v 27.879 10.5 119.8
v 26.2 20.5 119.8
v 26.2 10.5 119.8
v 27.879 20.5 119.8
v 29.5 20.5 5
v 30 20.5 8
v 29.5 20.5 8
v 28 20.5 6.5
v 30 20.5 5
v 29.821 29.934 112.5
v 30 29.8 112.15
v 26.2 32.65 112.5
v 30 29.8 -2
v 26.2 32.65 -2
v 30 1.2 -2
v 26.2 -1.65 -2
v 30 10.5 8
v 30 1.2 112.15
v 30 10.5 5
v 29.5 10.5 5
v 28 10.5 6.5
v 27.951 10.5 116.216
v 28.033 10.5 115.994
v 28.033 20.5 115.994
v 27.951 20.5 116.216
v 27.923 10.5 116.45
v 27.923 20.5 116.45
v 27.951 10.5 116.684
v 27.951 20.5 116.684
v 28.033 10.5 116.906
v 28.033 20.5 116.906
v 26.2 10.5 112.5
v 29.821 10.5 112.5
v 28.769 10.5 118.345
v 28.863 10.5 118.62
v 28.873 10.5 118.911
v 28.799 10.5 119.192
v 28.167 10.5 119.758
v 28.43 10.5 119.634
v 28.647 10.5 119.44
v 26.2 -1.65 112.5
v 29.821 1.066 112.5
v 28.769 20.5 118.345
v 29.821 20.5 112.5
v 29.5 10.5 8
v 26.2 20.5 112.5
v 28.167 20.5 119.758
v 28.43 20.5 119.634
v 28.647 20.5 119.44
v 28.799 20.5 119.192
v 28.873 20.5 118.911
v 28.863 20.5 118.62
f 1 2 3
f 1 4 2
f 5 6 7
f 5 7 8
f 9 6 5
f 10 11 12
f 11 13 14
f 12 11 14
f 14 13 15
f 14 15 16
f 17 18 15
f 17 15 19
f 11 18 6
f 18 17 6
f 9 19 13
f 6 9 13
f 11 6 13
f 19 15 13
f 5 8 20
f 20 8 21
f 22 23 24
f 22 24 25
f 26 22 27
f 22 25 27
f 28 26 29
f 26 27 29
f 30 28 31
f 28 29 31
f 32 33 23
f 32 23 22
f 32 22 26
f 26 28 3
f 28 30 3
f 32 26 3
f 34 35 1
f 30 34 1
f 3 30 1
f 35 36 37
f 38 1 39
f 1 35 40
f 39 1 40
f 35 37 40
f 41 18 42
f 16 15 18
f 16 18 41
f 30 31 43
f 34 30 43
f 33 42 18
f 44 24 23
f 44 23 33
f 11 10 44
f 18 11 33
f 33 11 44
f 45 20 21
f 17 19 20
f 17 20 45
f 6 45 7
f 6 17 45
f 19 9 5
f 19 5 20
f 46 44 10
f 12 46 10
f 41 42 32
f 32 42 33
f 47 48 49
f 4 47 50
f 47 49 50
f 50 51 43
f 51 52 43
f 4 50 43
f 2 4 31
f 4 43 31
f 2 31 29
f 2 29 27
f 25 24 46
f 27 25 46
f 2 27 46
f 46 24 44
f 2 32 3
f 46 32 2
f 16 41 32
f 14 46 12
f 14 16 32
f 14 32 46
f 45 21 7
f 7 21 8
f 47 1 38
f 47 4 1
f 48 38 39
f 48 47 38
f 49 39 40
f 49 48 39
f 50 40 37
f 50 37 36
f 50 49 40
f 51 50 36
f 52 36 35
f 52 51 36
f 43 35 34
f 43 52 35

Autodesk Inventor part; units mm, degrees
ref_plane "YZ Plane" through (0, 0, 0) normal (1, 0, 0) x (0, 1, 0)
ref_plane "Work Plane3" through (0, -2, -2) normal (0, 0, -1) x (-1, 0, 0)
sketch "Sketch4" plane through (0, -2, -2) normal (0, 0, -1) x (-1, 0, 0)
  line L0 (-30, 2) -> (-30, 3) projected
  line L1 (3, -2) -> (-26, -2) projected
  line L2 (7, 2) -> (7, 33) projected
  line L3 (3, 37) -> (-26, 37) projected
  line L4 (-27, 17.5) -> (-42, 17.5)
  line L5 (-30, 3.2) -> (-26, 0.2)
  line L6 (-26.2, 0.2) -> (-26.2, 17.5)
  line L7 (-30, 3.2) -> (-30, 17.5)
  line L8 (-30, 31.8) -> (-26, 34.8)
  line L9 (-26.2, 34.8) -> (-26.2, 17.5)
  line L10 (-30, 31.8) -> (-30, 17.5)
  arc A0 (3, -2) -> (7, 2) centre (3, 2) ccw projected
  arc A1 (7, 33) -> (3, 37) centre (3, 33) ccw projected
  arc A2 (-26, 37) -> (-30, 33) centre (-26, 33) ccw projected
  arc A3 (-30, 2) -> (-26, -2) centre (-26, 2) ccw projected
  line L11 (-30, 32) -> (-30, 33) projected
  line L12 (-26, 35) -> (-26, 0) projected
  line L13 (-26, 0) -> (-30, 3) projected
  line L14 (-26.2, 3.2) -> (-25.2, 3.2)
  line L15 (-25.2, 3.2) -> (-25.2, 17.5)
  line L16 (-26.2, 31.8) -> (-25.2, 31.8)
  line L17 (-25.2, 31.8) -> (-25.2, 17.5)
  line L18 (-30, 32) -> (-26, 35) projected
  circle A4 centre (-11.5, 17.5) radius 8 projected
  point P0 (0, 2)
  point P1 (-26.2, 0.35)
  point P2 (-26.2, 34.65)
  point P3 (-26.2, 31.8)
  dimension "d55" = 1
  dimension "d56" = 4
  dimension "d57" = 3
  dimension "d58" = 0.2
  dimension "d59" = 3.8
extrude "Whole Cover" add sketch "Sketch4" against normal blind 122 contours L5 L7 L10 L8 L9 L6
ref_plane "Work Plane4" through (0, 15.5, 120) normal (0, -1, 0) x (0, 0, -1)
sketch "Sketch5" plane through (0, 15.5, 120) normal (0, -1, 0) x (0, 0, -1)
  line L0 (122, 30) -> (0, 30) projected
  line L1 (122, 26.2) -> (0, 26.2) projected
  line L2 (0, 26.2) -> (0, 30)
  line L3 (7.85, 30) -> (-0.75, 30)
  line L4 (3.55, 30) -> (3.55, 27.8)
  line L5 (3.0945, 28.033) -> (-0.75, 30)
  line L6 (4.0055, 28.033) -> (7.85, 30)
  arc A0 (3.0945, 28.033) -> (4.0055, 28.033) centre (3.55, 28.9233) ccw
  point P0 (120, 0)
  point P1 (0, 29.6163)
  point P2 (0, 30)
  dimension "d45" = 8.6
  dimension "d47" = 2.2
  dimension "d48" = 1
extrude "Snap fit" cut sketch "Sketch5" along normal through all both and the other way through all
sketch "Sketch6" plane through (30, 1.2, -2) normal (1, 0, 0) x (0, 0, -1)
  line L0 (0, -2.85) -> (0, 31.45) projected
  line L1 (0, 14.3) -> (-7, 14.3) construction
  line L2 (-7, 9.3) -> (-10, 9.3)
  line L3 (-10, 9.3) -> (-10, 19.3)
  line L4 (-10, 19.3) -> (-7, 19.3)
  line L5 (-7, 19.3) -> (-7, 9.3)
  point P0 (-2, -1.2)
  dimension "d15" = 3
  dimension "d16" = 10
  dimension "d17" = 7
extrude "Grip" cut sketch "Sketch6" against normal blind 2
chamfer "Grip Chamfer" distance 1.5 angle 45 2 edges at (28, 15.5, 8) (28, 15.5, 5)
sketch "Sketch9" plane through (30, 1.2, -2) normal (1, 0, 0) x (0, 0, -1)
  line L0 (0, 0) -> (-122, 0) projected
  line L1 (-122, 31.45) -> (-122, -2.85) projected
  line L2 (-122, 14.3) -> (-114.6731, 14.3)
  line L3 (0, -2.85) -> (-122, -2.85) projected
  line L4 (-122, -2.85) -> (-114.5, -2.85)
  line L5 (-114.5, -2.85) -> (-114.5, 0.15)
  line L6 (-114.5, 0.15) -> (-122, 0.15)
  line L7 (-122, 0.15) -> (-122, -2.85)
  line L8 (-122, 31.45) -> (-114.5, 31.45)
  line L9 (-114.5, 31.45) -> (-114.5, 28.45)
  line L10 (-114.5, 28.45) -> (-122, 28.45)
  line L11 (-122, 28.45) -> (-122, 31.45)
  line L12 (-122, 28.45) -> (-121.8, 28.45)
  line L13 (-121.8, 28.45) -> (-121.8, 0.15)
  line L14 (-121.8, 0.15) -> (-122, 0.15)
  line L15 (-122, 0.15) -> (-122, 28.45)
  line L16 (-117.25, 0.15) -> (-117.25, -2.85)
  line L17 (-117.25, 28.45) -> (-117.25, 31.45)
  line L18 (-114.5, 9.3) -> (-122.5, 9.3)
  line L19 (-122.5, 9.3) -> (-122.5, 19.3)
  line L20 (-122.5, 19.3) -> (-114.5, 19.3)
  line L21 (-114.5, 19.3) -> (-114.5, 9.3)
  line L22 (-114.5, 0.15) -> (-114.5, 9.3)
  line L23 (-114.5, 19.3) -> (-114.5, 28.45)
  point P0 (-2, -1.2)
  point P1 (-117.25, 0)
  point P2 (-117.25, 28.6)
  point P3 (-122, 28.6)
  point P4 (-117.25, 0)
  point P5 (-114.5, 0)
  point P6 (-121.8, 9.3)
  point P7 (-121.8, 19.3)
  dimension "d41" = 7.5
  dimension "d42" = 3
  dimension "d43" = 0.2
  dimension "d44" = 2.75
  dimension "d49" = 8
  dimension "d50" = 10
extrude "Corner Cut" cut sketch "Sketch9" against normal through all contours L5 L3 L16 L0 | L0 L16 L6 L5 | L16 L3 L1 L0 | L0 L1 L6 L16 | L6 L13 L18 L22 | L1 L18 L13 L6 | L18 L1 L2 L13 | L20 L13 L10 L23 | L2 L1 L20 L13 | L20 L1 L10 L13 | L10 L17 L8 L9 | L10 L1 L8 L17
fillet "Fillet5" radius 1 1 edges at (29.514, 15.5, 119.8)
properties part number "enclosure cover_3DPrint"
